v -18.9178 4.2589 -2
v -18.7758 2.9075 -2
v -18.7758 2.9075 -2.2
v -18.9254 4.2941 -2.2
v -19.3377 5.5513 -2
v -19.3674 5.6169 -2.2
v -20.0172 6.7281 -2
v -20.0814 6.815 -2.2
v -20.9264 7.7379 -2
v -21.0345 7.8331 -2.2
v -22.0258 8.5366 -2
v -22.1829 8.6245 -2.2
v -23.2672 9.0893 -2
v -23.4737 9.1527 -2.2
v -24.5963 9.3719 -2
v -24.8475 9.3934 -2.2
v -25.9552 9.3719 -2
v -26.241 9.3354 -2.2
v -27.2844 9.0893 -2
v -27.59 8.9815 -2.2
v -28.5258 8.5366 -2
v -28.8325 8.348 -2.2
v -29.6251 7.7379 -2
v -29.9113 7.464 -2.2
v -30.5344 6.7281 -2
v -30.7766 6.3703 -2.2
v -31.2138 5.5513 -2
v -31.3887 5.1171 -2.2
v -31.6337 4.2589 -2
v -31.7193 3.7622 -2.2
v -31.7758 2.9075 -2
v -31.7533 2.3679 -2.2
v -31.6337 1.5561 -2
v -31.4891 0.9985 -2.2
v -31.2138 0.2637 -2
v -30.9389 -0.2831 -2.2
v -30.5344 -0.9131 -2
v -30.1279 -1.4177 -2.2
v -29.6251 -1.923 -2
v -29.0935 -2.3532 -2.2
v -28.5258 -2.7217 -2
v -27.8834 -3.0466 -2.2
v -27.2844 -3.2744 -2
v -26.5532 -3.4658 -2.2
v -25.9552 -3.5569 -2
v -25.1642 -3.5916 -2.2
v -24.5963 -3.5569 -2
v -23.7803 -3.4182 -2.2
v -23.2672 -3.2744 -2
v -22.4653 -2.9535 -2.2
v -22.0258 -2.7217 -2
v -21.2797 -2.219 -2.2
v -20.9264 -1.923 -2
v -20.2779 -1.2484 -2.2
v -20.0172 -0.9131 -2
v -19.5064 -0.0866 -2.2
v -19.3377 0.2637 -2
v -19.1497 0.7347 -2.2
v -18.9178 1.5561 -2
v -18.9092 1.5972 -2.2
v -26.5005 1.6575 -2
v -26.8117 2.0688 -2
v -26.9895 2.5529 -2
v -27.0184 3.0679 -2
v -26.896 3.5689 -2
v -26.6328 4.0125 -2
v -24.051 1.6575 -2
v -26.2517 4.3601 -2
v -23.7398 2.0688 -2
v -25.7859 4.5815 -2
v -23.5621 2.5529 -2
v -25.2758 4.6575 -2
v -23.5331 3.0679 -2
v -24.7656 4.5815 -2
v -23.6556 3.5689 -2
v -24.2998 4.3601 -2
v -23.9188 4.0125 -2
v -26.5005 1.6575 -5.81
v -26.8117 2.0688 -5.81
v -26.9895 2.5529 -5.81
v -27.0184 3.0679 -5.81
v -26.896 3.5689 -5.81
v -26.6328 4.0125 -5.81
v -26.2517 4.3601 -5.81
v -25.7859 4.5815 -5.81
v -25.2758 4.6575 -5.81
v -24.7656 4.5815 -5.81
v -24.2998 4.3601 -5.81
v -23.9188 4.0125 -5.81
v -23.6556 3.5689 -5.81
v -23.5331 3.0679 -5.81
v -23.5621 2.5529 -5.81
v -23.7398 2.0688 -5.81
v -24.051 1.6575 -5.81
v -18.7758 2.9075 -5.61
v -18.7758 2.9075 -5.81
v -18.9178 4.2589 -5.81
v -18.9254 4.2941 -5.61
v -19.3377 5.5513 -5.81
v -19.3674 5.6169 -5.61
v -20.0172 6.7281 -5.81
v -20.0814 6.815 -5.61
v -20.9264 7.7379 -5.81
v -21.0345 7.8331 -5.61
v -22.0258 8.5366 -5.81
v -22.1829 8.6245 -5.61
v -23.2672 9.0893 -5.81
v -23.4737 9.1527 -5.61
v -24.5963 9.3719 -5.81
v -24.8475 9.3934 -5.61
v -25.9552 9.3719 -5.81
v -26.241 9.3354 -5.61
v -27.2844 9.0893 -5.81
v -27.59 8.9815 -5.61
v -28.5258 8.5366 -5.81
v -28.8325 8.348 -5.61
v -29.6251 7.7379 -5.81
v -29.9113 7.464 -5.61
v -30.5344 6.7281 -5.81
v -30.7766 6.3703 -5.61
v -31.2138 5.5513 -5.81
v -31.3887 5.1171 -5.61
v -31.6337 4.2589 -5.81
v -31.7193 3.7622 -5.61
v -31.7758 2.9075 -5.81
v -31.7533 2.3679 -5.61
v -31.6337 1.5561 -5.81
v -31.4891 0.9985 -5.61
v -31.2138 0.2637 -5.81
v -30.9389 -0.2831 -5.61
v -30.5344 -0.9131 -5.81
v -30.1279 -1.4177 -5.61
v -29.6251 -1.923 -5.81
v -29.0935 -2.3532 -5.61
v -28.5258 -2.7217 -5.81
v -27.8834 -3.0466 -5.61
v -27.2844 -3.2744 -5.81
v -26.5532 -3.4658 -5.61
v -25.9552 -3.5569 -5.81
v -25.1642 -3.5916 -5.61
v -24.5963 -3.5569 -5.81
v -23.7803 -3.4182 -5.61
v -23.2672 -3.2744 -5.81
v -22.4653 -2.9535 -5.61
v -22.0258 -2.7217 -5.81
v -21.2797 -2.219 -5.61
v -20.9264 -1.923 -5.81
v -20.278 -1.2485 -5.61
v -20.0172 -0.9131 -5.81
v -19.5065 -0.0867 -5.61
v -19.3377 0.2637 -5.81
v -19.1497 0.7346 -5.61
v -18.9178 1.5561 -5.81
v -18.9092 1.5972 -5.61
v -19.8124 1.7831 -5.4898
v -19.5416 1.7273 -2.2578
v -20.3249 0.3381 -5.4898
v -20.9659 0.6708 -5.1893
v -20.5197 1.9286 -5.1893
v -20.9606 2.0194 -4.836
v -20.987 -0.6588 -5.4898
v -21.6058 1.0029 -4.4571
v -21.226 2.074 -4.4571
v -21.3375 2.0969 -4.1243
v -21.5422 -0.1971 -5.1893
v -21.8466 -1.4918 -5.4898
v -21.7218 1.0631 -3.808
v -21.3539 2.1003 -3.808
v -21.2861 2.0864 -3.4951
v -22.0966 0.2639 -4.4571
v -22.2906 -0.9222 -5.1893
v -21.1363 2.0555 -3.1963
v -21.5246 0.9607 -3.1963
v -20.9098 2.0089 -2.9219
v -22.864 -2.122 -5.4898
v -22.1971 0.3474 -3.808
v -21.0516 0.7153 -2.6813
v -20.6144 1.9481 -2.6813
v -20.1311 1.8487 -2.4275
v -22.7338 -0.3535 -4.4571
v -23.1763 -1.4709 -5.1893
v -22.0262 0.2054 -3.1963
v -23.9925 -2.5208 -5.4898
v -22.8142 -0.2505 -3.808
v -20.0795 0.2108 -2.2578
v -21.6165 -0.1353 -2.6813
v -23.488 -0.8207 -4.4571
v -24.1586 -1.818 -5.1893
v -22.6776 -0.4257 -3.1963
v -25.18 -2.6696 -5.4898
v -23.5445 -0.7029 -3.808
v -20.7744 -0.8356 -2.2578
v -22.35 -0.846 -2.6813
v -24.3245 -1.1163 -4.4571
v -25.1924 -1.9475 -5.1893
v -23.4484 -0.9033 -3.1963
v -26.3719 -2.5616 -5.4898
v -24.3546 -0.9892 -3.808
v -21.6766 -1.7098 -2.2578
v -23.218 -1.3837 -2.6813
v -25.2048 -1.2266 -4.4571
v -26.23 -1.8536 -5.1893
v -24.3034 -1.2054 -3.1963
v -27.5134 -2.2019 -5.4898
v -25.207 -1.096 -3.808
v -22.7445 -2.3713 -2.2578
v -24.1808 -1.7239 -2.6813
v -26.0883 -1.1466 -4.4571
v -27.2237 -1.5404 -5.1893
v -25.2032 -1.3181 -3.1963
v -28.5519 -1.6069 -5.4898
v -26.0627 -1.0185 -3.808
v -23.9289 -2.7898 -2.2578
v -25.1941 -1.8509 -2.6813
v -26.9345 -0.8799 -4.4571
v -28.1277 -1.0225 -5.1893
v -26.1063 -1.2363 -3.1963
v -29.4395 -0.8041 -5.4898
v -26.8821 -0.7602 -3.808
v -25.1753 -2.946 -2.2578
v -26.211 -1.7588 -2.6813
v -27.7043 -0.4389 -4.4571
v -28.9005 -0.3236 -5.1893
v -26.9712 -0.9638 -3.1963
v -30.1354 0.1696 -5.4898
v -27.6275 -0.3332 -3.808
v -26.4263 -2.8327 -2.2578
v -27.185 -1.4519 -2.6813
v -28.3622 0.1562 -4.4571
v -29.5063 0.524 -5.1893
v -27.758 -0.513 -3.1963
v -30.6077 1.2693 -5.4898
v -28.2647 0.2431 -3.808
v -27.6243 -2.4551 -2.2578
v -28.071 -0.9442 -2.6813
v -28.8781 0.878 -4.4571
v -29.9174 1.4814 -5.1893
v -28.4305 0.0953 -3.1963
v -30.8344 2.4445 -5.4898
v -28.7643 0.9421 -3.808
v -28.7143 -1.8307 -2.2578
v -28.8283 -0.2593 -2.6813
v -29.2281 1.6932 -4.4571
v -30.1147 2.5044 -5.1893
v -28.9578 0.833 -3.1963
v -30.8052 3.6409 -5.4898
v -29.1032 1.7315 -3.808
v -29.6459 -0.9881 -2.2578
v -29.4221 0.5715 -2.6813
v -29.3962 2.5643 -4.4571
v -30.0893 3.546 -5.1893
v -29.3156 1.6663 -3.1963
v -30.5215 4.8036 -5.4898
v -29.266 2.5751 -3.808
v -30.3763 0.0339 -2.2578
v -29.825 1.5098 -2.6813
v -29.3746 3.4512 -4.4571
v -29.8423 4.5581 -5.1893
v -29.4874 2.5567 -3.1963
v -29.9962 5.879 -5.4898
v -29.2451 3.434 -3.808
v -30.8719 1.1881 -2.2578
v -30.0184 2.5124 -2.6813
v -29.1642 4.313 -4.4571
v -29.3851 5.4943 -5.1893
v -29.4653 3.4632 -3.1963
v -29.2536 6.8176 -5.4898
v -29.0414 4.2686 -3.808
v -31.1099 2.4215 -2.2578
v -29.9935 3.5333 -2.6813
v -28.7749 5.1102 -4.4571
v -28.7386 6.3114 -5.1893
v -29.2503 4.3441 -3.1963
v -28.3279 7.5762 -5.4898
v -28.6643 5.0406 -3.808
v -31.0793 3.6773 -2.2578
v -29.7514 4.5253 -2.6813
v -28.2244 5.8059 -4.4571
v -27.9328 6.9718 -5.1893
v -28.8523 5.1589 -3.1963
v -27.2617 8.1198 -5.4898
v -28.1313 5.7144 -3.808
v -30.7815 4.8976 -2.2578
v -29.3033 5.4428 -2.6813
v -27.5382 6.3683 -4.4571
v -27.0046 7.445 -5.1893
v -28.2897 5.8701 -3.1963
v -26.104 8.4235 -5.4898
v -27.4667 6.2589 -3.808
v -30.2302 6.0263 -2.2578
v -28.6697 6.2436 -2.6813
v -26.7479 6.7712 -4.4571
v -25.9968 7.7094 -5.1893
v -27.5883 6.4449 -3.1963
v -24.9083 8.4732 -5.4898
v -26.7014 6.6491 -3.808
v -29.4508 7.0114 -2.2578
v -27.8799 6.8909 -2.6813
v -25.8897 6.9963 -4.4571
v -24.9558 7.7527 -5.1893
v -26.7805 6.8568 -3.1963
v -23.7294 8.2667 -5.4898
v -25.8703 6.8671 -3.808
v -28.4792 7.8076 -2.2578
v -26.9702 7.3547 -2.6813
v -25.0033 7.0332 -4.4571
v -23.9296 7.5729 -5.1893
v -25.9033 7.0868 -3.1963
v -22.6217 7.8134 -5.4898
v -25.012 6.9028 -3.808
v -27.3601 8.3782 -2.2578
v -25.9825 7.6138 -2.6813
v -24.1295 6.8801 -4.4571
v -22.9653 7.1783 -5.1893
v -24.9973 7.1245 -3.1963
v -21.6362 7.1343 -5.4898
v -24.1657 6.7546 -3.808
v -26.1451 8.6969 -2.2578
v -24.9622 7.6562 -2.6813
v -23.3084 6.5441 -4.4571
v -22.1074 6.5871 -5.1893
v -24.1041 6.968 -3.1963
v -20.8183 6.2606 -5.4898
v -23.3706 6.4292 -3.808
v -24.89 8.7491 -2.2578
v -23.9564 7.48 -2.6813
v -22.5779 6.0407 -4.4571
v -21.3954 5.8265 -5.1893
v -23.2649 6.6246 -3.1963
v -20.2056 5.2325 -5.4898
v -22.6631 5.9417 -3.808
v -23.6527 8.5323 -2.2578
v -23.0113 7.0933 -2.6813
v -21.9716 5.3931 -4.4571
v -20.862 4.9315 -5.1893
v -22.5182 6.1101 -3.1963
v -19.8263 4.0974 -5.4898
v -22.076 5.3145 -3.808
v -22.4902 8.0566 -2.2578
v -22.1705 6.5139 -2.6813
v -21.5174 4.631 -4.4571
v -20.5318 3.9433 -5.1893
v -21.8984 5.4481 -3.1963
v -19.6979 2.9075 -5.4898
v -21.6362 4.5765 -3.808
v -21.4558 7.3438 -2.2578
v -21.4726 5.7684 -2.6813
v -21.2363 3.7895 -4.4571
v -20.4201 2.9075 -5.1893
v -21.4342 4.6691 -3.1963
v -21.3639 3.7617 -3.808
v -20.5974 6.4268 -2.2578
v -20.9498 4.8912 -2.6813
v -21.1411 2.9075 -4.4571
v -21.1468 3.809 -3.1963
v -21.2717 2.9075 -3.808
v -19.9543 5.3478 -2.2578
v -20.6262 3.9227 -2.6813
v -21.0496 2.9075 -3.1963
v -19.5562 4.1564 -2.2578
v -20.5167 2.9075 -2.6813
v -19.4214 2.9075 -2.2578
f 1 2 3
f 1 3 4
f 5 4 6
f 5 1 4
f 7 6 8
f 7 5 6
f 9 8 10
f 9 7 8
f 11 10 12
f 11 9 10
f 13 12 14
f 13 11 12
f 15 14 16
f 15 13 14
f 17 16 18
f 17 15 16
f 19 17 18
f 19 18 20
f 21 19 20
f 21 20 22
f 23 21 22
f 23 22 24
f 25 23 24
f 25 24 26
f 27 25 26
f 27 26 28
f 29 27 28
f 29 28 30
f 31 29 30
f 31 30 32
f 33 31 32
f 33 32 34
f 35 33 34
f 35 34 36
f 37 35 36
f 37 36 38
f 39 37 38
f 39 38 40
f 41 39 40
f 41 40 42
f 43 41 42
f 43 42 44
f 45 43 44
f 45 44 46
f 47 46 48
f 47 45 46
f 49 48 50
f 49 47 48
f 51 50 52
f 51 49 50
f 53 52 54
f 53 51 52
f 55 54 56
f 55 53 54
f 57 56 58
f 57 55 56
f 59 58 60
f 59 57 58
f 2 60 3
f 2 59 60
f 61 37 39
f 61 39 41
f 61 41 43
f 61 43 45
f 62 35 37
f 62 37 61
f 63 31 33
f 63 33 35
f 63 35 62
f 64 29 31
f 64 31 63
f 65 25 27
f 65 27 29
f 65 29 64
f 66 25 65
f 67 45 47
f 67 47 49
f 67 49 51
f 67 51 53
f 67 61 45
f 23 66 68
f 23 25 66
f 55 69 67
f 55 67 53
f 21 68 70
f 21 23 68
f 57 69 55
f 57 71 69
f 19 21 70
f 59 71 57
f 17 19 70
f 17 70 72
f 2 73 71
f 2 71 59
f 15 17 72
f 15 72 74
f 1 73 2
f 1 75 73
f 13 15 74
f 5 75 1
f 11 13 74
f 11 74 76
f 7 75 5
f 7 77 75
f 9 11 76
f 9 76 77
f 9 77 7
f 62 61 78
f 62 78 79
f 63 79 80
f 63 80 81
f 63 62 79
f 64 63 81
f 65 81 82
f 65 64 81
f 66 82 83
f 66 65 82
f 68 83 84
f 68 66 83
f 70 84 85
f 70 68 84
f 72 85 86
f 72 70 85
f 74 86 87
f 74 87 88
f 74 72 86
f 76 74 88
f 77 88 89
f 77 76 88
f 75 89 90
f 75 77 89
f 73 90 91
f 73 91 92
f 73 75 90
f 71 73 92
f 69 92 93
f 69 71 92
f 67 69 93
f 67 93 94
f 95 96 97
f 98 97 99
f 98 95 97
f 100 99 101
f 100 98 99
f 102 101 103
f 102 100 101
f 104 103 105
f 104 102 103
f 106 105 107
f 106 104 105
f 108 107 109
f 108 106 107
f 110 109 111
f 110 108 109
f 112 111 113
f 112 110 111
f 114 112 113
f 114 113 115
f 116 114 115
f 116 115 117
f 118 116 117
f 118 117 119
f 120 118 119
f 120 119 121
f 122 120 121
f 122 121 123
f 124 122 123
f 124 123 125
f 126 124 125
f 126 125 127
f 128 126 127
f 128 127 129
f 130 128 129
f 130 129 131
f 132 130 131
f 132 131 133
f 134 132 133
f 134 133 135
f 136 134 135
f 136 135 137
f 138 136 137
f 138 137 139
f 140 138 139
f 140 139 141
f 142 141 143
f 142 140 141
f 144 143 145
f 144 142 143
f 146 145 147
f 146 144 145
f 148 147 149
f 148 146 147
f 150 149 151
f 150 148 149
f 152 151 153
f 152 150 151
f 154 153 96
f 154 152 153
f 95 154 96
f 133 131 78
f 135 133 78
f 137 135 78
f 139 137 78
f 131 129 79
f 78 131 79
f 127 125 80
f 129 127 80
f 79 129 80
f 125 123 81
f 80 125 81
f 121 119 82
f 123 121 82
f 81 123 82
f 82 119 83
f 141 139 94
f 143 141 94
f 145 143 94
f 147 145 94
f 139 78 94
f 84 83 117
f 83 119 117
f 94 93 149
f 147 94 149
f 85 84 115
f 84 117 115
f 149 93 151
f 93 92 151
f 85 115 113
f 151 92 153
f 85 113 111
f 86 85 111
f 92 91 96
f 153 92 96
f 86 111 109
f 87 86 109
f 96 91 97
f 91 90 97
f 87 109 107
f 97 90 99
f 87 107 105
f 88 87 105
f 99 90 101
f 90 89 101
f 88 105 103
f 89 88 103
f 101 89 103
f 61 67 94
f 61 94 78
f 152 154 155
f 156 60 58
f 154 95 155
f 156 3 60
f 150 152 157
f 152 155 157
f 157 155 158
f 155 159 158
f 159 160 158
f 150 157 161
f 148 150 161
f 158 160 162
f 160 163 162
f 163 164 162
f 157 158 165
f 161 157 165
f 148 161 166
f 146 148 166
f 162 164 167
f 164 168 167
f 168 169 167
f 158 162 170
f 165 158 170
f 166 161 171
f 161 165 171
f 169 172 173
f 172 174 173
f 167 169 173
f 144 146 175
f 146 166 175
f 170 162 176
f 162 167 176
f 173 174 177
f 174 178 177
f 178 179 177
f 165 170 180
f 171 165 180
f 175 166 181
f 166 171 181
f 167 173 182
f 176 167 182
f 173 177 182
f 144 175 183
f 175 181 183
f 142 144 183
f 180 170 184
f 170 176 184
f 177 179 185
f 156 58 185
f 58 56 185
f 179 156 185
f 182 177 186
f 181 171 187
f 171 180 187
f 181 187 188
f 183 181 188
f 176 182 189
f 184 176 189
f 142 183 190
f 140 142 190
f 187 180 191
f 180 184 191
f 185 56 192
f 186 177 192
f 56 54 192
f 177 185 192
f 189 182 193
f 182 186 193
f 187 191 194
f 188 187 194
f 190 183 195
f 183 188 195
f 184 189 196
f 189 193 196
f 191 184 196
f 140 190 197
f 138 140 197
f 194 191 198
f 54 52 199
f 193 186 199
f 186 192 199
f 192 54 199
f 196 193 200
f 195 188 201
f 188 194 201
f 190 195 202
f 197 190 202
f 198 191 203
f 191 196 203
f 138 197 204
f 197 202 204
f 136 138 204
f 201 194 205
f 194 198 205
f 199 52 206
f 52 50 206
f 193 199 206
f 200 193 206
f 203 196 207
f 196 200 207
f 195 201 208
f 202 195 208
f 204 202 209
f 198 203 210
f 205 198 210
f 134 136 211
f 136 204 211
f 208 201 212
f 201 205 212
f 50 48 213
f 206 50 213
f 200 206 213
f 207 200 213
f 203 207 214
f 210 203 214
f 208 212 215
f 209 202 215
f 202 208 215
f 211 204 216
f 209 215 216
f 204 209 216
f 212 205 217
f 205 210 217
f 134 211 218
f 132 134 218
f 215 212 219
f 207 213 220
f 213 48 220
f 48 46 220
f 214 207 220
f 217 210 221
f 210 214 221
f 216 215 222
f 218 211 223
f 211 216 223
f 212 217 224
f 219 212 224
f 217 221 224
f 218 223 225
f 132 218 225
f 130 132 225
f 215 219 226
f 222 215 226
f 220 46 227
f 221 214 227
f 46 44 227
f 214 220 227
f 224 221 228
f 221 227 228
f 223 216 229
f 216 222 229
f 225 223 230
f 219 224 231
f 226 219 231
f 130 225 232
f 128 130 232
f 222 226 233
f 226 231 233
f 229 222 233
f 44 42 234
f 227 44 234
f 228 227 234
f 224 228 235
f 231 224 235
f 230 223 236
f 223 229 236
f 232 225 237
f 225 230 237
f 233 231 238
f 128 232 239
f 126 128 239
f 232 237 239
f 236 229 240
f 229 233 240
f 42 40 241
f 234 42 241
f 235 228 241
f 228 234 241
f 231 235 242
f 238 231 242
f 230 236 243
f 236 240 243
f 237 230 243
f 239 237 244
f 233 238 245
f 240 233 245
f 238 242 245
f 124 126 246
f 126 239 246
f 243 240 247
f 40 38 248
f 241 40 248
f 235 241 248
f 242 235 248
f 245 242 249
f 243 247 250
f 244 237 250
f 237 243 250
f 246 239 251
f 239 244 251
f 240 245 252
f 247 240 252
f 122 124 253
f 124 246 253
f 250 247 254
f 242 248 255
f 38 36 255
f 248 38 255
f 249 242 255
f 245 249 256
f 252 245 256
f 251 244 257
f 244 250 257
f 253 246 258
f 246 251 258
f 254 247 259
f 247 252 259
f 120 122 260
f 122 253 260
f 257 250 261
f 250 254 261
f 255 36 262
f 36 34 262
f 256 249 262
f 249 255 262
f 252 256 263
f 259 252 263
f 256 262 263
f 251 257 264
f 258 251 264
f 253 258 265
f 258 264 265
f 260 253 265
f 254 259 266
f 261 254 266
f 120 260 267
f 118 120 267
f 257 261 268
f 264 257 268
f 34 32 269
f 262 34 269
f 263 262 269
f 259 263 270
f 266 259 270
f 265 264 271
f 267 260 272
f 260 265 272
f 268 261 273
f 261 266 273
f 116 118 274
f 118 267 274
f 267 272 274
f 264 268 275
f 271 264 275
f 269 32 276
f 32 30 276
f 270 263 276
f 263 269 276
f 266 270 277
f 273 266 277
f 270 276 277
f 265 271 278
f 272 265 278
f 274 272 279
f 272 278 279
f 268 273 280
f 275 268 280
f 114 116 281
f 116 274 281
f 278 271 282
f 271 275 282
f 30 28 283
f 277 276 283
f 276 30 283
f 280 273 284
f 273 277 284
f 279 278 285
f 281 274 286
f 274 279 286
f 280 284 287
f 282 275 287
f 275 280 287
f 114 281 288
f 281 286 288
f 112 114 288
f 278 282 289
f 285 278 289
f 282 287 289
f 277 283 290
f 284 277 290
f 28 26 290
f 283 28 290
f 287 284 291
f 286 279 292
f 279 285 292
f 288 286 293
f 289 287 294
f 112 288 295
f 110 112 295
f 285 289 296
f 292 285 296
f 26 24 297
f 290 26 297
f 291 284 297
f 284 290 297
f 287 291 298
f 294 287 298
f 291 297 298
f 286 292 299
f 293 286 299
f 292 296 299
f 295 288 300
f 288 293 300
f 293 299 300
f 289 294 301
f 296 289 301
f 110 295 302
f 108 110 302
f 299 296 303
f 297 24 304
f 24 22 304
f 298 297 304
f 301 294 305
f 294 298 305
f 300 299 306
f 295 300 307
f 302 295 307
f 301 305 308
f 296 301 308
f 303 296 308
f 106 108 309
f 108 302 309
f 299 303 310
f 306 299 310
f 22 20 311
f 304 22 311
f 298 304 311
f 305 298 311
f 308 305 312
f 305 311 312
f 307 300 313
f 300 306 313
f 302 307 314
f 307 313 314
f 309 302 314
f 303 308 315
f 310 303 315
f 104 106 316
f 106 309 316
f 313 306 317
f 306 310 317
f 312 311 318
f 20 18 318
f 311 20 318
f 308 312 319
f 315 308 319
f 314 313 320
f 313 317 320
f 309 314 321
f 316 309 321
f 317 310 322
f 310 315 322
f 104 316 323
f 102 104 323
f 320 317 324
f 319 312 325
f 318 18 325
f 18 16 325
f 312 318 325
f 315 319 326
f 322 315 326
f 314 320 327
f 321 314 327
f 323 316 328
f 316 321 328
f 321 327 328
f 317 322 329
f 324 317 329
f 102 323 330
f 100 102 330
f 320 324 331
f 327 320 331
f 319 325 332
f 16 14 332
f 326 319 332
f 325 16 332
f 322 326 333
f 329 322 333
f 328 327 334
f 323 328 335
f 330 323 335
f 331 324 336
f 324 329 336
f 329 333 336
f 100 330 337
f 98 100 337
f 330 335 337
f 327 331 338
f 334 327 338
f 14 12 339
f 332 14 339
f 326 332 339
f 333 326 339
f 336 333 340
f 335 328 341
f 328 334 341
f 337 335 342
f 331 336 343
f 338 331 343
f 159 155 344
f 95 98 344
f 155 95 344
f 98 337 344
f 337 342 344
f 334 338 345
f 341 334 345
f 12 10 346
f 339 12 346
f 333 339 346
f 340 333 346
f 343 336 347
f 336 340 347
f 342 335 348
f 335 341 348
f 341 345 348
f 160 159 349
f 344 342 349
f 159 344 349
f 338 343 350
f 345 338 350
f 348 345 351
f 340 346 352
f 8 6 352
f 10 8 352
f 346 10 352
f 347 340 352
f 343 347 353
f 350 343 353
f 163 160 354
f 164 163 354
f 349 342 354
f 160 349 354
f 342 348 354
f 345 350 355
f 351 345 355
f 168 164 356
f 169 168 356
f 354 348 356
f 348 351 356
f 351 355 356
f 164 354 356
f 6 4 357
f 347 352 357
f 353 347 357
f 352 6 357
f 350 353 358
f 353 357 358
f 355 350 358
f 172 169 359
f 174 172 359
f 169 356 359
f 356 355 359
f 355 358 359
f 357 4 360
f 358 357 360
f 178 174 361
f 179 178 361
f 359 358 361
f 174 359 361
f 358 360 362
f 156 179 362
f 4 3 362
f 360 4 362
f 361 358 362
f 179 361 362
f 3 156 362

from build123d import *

# Parameters (mm, degrees)
BOSS_EXTRUDE1_START = -2
SKETCH1_R           = 6.5
BOSS_EXTRUDE1_DEPTH = 3.81
SKETCH2_RX          = 2.5
SKETCH2_RY          = 1.705


with BuildPart() as part:
    # Sketch1 → Boss-Extrude1 (new body)
    with BuildSketch(Plane.XY.offset(BOSS_EXTRUDE1_START)):
        with Locations((-25.275773863, 2.907479065)):
            Circle(SKETCH1_R)
        with BuildLine():
            ThreePointArc((-26.500518734, 1.657479065), (-25.275773863, 4.657479065), (-24.051028992, 1.657479065))
            Line((-24.051028992, 1.657479065), (-26.500518734, 1.657479065))
        make_face(mode=Mode.SUBTRACT)
    extrude(amount=-BOSS_EXTRUDE1_DEPTH)

    # Sketch2 → Cut-Revolve1 (revolve, cut)
    with BuildSketch(Plane(origin=(-0.41524981, -2.209102148, 0), x_dir=(-0.9794707520439397, 0.2015863236692392, 0), z_dir=(0.2015863236692392, 0.9794707520439397, 0))):
        with Locations(Location((18.881588986, -3.905), (0, 0, 180))):
            Ellipse(SKETCH2_RX, SKETCH2_RY)
    revolve(axis=Axis((-25.275773863, 2.907479065, 0.773144213), (0, 0, -1)), mode=Mode.SUBTRACT)


solid = part.part
